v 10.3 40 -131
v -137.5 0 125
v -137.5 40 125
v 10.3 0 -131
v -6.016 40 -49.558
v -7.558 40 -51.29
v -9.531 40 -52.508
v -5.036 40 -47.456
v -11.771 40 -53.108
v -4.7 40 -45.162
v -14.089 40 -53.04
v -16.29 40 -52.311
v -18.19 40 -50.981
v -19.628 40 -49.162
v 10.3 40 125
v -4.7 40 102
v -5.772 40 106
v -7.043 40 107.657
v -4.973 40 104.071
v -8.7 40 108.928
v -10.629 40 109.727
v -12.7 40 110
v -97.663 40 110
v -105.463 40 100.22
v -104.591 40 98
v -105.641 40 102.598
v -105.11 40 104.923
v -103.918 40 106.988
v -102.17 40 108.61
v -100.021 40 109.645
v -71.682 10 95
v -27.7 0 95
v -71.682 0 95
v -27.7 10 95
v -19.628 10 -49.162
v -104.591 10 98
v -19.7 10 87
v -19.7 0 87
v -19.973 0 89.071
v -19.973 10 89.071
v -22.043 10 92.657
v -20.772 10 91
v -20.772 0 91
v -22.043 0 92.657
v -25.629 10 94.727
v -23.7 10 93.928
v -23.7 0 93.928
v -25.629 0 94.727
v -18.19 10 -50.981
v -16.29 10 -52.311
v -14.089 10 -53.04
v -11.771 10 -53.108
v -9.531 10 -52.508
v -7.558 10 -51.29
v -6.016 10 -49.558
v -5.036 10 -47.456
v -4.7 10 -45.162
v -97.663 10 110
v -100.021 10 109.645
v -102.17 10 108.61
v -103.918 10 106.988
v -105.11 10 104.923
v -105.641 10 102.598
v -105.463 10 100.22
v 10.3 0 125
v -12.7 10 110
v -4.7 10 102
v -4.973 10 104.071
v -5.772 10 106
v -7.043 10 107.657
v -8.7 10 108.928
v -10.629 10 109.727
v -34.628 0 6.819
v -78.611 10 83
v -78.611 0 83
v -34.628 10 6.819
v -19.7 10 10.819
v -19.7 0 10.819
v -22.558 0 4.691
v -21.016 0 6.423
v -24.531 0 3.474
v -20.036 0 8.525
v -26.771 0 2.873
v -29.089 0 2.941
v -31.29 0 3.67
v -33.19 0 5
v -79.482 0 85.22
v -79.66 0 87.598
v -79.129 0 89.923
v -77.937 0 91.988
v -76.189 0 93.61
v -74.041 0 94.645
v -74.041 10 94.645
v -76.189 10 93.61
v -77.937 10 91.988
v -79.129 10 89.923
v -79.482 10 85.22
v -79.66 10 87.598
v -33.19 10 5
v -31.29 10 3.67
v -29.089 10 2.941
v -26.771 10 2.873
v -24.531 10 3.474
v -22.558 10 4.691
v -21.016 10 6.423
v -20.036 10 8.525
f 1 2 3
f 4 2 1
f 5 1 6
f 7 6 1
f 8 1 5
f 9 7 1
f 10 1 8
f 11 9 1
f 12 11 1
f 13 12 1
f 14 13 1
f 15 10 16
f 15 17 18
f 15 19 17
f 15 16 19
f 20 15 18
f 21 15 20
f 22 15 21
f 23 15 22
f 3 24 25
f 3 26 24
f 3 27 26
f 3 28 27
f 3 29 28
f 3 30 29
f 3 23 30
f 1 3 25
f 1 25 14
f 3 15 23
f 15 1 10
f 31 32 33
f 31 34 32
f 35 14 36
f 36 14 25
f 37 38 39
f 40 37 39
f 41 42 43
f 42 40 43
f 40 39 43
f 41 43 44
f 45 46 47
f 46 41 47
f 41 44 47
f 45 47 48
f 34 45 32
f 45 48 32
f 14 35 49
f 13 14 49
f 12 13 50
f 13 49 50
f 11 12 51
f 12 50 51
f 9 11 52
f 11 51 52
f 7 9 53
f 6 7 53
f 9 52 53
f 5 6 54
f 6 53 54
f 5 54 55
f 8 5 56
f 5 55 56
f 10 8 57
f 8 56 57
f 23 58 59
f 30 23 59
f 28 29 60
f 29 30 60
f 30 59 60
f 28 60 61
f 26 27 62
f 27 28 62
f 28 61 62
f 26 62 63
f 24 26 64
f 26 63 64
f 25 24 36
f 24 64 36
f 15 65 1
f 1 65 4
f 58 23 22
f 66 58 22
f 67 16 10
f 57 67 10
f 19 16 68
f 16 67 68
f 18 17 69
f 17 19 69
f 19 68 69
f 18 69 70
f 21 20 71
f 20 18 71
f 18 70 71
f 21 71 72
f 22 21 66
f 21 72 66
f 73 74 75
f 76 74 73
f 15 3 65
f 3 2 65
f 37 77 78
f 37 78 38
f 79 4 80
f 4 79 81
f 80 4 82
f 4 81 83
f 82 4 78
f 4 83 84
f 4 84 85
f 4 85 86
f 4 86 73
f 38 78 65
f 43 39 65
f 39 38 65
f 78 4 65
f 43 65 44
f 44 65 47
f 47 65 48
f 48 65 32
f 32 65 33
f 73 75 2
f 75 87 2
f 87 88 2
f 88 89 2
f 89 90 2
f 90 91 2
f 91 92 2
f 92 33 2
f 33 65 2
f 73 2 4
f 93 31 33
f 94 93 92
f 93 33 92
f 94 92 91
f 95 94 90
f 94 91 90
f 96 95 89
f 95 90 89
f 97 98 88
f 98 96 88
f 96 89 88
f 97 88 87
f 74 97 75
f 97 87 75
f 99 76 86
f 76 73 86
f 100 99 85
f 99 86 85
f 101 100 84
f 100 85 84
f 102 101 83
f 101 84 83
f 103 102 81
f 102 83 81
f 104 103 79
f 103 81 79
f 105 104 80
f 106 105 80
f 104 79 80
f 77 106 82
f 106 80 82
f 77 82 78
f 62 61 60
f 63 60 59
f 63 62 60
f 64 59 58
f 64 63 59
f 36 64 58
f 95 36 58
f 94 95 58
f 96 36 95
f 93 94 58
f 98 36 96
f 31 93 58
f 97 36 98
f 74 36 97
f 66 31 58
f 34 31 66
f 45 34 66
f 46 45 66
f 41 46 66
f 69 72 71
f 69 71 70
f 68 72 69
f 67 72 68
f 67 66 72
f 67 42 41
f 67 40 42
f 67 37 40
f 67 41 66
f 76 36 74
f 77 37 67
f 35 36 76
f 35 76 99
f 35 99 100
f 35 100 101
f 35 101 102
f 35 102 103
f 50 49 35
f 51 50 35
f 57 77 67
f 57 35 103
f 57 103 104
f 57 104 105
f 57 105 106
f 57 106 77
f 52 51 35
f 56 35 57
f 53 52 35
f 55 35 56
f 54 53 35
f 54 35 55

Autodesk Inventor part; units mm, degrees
ref_plane "YZ Plane" through (0, 0, 0) normal (1, 0, 0) x (0, 1, 0)
ref_plane "XZ Plane" through (0, 0, 0) normal (0, 1, 0) x (-1, 0, 0)
ref_plane "XY Plane" through (0, 0, 0) normal (0, 0, 1) x (1, 0, 0)
sketch "Sketch1" plane through (0, 0, 0) normal (0, 1, 0) x (-1, 0, 0)
  line L0 (137.5, 125) -> (-10.3, 125)
  line L1 (-10.3, 125) -> (-10.3, -131)
  line L2 (-10.3, -131) -> (137.5, -131)
  line L3 (137.5, -131) -> (137.5, 125)
  line L4 (137.5, 125) -> (-10.3, -131)
  point P0 (0, 0)
  dimension "d0" = 256
  dimension "d1" = 147.8
  dimension "d7" = 30
extrude "Extrusion1" add sketch "Sketch1" along normal blind 40 contours L4 L1 L0
sketch "Sketch2" plane through (0, 40, 0) normal (0, 1, 0) x (1, 0, 0)
  line L0 (-137.5, -125) -> (10.3, -125) construction
  line L1 (10.3, -125) -> (10.3, 131) construction
  line L2 (10.3, 131) -> (-137.5, -125) construction
  line L3 (-137.5, -125) -> (10.3, -125) construction
  line L4 (10.3, -125) -> (10.3, 131) construction
  line L5 (10.3, 131) -> (-137.5, -125) construction
  line L6 (-111.5194, -110) -> (-4.7, -110)
  line L7 (-4.7, -110) -> (-4.7, 75.0187)
  line L8 (-4.7, 75.0187) -> (-111.5194, -110)
  point P0 (0, 0)
  dimension "d4" = 15
extrude "Extrusion2" cut sketch "Sketch2" against normal blind 30
sketch "Sketch3" plane through (0, 10, 0) normal (0, 1, 0) x (1, 0, 0)
  line L0 (-4.7, 75.0187) -> (-4.7, -110) construction
  line L1 (-111.5194, -110) -> (-4.7, 75.0187) construction
  line L2 (-4.7, -110) -> (-111.5194, -110) construction
  point P0 (0, 0)
sketch "Sketch4" plane through (0, 10, 0) normal (0, 1, 0) x (1, 0, 0)
  line L0 (-4.7, 75.0187) -> (-4.7, -110) construction
  line L1 (-111.5194, -110) -> (-4.7, 75.0187) construction
  line L2 (-4.7, -110) -> (-111.5194, -110) construction
  line L3 (-4.7, 75.0187) -> (-4.7, -110) construction
  line L4 (-111.5194, -110) -> (-4.7, 75.0187) construction
  line L5 (-4.7, -110) -> (-111.5194, -110) construction
  line L6 (-19.7, 19.0374) -> (-19.7, -95)
  line L7 (-19.7, -95) -> (-85.5388, -95)
  line L8 (-85.5388, -95) -> (-19.7, 19.0374)
  point P0 (0, 0)
  dimension "d9" = 15
extrude "Extrusion3" cut sketch "Sketch4" against normal blind 30
fillet "Fillet2" radius 8 6 edges at (-4.7, 25, -75.0187) (-111.5194, 25, 110) (-4.7, 25, 110) (-19.7, 5, 95) (-85.5388, 5, 95) (-19.7, 5, -19.0374)
properties part number "StaninaOpora.iam" material "Aluminum 6061"
